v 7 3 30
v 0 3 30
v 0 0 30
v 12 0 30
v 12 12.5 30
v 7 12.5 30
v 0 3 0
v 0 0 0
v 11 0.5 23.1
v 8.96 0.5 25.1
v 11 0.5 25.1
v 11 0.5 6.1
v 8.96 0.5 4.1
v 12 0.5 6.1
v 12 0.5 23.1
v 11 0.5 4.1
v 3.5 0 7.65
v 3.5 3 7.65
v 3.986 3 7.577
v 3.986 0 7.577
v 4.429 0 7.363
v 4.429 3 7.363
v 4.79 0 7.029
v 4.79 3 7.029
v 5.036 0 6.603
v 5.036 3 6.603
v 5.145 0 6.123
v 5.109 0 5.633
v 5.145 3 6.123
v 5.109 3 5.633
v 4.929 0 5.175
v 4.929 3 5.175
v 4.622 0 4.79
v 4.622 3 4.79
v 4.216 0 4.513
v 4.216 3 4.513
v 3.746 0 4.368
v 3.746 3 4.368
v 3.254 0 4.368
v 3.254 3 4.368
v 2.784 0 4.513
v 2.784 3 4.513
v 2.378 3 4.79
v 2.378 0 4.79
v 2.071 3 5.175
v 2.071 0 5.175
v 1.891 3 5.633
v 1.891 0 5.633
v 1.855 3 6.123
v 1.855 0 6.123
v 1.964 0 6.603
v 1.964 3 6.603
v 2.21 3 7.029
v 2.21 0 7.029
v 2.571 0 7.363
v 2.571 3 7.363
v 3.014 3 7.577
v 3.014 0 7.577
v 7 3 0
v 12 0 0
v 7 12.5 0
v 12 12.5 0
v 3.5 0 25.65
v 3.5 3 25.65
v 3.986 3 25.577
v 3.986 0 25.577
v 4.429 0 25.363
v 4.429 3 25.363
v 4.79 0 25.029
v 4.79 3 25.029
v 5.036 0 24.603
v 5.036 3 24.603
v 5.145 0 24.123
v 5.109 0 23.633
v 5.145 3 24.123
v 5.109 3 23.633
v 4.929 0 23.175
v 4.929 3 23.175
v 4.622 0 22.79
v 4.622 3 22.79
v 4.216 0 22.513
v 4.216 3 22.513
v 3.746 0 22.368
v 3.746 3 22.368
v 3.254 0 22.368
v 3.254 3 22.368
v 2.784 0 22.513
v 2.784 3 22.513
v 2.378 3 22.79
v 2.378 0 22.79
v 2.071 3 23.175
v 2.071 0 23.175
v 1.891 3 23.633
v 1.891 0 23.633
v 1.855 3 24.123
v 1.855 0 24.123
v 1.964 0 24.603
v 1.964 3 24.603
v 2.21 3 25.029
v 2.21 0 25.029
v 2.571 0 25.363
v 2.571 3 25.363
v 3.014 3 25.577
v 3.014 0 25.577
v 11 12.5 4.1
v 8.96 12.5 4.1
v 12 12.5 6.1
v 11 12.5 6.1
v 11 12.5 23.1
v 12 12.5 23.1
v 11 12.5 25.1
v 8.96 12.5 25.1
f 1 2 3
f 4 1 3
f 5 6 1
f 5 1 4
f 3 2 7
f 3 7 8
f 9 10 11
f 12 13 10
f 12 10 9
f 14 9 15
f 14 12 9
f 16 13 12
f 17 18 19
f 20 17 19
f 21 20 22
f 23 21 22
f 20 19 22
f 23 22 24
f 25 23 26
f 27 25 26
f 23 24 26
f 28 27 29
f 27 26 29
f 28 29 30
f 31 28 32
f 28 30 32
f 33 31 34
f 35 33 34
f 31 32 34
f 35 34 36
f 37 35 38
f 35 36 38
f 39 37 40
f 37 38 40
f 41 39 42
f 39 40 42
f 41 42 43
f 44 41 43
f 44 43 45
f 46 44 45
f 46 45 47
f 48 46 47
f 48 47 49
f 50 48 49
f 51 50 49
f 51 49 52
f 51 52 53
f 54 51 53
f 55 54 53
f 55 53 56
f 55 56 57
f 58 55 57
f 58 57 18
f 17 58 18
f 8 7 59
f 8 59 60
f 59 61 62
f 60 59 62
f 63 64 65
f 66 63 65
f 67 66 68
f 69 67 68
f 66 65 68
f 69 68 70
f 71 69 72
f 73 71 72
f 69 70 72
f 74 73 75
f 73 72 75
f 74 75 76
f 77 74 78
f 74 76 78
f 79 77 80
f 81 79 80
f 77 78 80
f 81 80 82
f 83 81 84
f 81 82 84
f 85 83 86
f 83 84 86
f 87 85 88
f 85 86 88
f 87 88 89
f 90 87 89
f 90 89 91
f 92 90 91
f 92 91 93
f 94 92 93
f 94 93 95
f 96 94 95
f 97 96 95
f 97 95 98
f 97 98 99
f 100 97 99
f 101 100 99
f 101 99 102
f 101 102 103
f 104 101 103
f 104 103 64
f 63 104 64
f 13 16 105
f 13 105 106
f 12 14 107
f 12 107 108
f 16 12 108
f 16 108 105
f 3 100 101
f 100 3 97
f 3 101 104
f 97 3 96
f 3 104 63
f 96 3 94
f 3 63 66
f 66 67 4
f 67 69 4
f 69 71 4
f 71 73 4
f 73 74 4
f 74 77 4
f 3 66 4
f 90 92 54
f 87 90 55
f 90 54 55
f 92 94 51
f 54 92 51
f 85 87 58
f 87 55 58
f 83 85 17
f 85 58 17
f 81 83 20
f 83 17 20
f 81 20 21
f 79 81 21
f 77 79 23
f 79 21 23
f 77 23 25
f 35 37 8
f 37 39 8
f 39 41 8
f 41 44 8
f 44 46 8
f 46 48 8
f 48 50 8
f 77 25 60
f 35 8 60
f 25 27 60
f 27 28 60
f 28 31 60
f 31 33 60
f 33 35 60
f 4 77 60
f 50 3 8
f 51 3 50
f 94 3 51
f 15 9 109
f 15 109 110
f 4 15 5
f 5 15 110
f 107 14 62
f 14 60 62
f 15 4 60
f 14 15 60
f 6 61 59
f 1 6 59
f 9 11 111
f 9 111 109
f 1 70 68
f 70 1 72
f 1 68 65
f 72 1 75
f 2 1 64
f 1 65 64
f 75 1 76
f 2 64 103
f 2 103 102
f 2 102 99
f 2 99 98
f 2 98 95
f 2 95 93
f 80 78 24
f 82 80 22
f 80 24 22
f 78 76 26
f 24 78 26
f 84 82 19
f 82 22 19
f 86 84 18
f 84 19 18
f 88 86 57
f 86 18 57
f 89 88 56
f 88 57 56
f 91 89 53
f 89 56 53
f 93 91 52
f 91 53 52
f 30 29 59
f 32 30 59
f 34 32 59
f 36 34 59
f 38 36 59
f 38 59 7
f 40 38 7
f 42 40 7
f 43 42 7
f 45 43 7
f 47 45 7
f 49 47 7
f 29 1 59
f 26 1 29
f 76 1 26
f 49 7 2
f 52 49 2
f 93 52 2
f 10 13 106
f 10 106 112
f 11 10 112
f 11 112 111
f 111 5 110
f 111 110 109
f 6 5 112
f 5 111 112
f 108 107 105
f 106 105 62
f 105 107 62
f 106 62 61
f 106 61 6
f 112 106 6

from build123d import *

# Parameters (mm, degrees)
SALIENTE_EXTRUIR1_DEPTH = 30
CORTAR_EXTRUIR1_DEPTH   = 12
CORTAR_EXTRUIR2_REACH   = 35.679
CROQUIS3_R              = 1.65


with BuildPart() as part:
    # Croquis1 → Saliente-Extruir1 (new body)
    with BuildSketch(Plane.XY):
        Polygon((12, 0), (12, 12.5), (7, 12.5), (7, 3), (0, 3), (0, 0), align=None)
    extrude(amount=SALIENTE_EXTRUIR1_DEPTH)

    # Croquis2 → Cortar-Extruir1 (cut)
    with BuildSketch(Plane(origin=(0, 12.5, 0), x_dir=(1, 0, 0), z_dir=(0, 1, 0))):
        Polygon((12, -23.1), (12, -15), (12, -6.1), (11, -6.1), (11, -4.1), (8.96, -4.1), (8.96, -25.1), (11, -25.1), (11, -23.1), align=None)
    extrude(amount=-CORTAR_EXTRUIR1_DEPTH, mode=Mode.SUBTRACT)

    # Croquis3 → Cortar-Extruir2 (cut, up to next)
    with BuildSketch(Plane(origin=(0, 3, 0), x_dir=(1, 0, 0), z_dir=(0, 1, 0)), mode=Mode.PRIVATE) as cortar_extruir2_sk1:
        with Locations((3.5, -6)):
            Circle(CROQUIS3_R)
    cortar_extruir2_tool1 = extrude(cortar_extruir2_sk1.sketch, amount=-CORTAR_EXTRUIR2_REACH, mode=Mode.PRIVATE) & part.part
    # Croquis3 → Cortar-Extruir2 (cut, up to next)
    with BuildSketch(Plane(origin=(0, 3, 0), x_dir=(1, 0, 0), z_dir=(0, 1, 0)), mode=Mode.PRIVATE) as cortar_extruir2_sk2:
        with Locations((3.5, -24)):
            Circle(CROQUIS3_R)
    cortar_extruir2_tool2 = extrude(cortar_extruir2_sk2.sketch, amount=-CORTAR_EXTRUIR2_REACH, mode=Mode.PRIVATE) & part.part
    add(cortar_extruir2_tool1.solids().sort_by_distance((3.5, 3, 6))[0], mode=Mode.SUBTRACT)
    add(cortar_extruir2_tool2.solids().sort_by_distance((3.5, 3, 24))[0], mode=Mode.SUBTRACT)


solid = part.part
